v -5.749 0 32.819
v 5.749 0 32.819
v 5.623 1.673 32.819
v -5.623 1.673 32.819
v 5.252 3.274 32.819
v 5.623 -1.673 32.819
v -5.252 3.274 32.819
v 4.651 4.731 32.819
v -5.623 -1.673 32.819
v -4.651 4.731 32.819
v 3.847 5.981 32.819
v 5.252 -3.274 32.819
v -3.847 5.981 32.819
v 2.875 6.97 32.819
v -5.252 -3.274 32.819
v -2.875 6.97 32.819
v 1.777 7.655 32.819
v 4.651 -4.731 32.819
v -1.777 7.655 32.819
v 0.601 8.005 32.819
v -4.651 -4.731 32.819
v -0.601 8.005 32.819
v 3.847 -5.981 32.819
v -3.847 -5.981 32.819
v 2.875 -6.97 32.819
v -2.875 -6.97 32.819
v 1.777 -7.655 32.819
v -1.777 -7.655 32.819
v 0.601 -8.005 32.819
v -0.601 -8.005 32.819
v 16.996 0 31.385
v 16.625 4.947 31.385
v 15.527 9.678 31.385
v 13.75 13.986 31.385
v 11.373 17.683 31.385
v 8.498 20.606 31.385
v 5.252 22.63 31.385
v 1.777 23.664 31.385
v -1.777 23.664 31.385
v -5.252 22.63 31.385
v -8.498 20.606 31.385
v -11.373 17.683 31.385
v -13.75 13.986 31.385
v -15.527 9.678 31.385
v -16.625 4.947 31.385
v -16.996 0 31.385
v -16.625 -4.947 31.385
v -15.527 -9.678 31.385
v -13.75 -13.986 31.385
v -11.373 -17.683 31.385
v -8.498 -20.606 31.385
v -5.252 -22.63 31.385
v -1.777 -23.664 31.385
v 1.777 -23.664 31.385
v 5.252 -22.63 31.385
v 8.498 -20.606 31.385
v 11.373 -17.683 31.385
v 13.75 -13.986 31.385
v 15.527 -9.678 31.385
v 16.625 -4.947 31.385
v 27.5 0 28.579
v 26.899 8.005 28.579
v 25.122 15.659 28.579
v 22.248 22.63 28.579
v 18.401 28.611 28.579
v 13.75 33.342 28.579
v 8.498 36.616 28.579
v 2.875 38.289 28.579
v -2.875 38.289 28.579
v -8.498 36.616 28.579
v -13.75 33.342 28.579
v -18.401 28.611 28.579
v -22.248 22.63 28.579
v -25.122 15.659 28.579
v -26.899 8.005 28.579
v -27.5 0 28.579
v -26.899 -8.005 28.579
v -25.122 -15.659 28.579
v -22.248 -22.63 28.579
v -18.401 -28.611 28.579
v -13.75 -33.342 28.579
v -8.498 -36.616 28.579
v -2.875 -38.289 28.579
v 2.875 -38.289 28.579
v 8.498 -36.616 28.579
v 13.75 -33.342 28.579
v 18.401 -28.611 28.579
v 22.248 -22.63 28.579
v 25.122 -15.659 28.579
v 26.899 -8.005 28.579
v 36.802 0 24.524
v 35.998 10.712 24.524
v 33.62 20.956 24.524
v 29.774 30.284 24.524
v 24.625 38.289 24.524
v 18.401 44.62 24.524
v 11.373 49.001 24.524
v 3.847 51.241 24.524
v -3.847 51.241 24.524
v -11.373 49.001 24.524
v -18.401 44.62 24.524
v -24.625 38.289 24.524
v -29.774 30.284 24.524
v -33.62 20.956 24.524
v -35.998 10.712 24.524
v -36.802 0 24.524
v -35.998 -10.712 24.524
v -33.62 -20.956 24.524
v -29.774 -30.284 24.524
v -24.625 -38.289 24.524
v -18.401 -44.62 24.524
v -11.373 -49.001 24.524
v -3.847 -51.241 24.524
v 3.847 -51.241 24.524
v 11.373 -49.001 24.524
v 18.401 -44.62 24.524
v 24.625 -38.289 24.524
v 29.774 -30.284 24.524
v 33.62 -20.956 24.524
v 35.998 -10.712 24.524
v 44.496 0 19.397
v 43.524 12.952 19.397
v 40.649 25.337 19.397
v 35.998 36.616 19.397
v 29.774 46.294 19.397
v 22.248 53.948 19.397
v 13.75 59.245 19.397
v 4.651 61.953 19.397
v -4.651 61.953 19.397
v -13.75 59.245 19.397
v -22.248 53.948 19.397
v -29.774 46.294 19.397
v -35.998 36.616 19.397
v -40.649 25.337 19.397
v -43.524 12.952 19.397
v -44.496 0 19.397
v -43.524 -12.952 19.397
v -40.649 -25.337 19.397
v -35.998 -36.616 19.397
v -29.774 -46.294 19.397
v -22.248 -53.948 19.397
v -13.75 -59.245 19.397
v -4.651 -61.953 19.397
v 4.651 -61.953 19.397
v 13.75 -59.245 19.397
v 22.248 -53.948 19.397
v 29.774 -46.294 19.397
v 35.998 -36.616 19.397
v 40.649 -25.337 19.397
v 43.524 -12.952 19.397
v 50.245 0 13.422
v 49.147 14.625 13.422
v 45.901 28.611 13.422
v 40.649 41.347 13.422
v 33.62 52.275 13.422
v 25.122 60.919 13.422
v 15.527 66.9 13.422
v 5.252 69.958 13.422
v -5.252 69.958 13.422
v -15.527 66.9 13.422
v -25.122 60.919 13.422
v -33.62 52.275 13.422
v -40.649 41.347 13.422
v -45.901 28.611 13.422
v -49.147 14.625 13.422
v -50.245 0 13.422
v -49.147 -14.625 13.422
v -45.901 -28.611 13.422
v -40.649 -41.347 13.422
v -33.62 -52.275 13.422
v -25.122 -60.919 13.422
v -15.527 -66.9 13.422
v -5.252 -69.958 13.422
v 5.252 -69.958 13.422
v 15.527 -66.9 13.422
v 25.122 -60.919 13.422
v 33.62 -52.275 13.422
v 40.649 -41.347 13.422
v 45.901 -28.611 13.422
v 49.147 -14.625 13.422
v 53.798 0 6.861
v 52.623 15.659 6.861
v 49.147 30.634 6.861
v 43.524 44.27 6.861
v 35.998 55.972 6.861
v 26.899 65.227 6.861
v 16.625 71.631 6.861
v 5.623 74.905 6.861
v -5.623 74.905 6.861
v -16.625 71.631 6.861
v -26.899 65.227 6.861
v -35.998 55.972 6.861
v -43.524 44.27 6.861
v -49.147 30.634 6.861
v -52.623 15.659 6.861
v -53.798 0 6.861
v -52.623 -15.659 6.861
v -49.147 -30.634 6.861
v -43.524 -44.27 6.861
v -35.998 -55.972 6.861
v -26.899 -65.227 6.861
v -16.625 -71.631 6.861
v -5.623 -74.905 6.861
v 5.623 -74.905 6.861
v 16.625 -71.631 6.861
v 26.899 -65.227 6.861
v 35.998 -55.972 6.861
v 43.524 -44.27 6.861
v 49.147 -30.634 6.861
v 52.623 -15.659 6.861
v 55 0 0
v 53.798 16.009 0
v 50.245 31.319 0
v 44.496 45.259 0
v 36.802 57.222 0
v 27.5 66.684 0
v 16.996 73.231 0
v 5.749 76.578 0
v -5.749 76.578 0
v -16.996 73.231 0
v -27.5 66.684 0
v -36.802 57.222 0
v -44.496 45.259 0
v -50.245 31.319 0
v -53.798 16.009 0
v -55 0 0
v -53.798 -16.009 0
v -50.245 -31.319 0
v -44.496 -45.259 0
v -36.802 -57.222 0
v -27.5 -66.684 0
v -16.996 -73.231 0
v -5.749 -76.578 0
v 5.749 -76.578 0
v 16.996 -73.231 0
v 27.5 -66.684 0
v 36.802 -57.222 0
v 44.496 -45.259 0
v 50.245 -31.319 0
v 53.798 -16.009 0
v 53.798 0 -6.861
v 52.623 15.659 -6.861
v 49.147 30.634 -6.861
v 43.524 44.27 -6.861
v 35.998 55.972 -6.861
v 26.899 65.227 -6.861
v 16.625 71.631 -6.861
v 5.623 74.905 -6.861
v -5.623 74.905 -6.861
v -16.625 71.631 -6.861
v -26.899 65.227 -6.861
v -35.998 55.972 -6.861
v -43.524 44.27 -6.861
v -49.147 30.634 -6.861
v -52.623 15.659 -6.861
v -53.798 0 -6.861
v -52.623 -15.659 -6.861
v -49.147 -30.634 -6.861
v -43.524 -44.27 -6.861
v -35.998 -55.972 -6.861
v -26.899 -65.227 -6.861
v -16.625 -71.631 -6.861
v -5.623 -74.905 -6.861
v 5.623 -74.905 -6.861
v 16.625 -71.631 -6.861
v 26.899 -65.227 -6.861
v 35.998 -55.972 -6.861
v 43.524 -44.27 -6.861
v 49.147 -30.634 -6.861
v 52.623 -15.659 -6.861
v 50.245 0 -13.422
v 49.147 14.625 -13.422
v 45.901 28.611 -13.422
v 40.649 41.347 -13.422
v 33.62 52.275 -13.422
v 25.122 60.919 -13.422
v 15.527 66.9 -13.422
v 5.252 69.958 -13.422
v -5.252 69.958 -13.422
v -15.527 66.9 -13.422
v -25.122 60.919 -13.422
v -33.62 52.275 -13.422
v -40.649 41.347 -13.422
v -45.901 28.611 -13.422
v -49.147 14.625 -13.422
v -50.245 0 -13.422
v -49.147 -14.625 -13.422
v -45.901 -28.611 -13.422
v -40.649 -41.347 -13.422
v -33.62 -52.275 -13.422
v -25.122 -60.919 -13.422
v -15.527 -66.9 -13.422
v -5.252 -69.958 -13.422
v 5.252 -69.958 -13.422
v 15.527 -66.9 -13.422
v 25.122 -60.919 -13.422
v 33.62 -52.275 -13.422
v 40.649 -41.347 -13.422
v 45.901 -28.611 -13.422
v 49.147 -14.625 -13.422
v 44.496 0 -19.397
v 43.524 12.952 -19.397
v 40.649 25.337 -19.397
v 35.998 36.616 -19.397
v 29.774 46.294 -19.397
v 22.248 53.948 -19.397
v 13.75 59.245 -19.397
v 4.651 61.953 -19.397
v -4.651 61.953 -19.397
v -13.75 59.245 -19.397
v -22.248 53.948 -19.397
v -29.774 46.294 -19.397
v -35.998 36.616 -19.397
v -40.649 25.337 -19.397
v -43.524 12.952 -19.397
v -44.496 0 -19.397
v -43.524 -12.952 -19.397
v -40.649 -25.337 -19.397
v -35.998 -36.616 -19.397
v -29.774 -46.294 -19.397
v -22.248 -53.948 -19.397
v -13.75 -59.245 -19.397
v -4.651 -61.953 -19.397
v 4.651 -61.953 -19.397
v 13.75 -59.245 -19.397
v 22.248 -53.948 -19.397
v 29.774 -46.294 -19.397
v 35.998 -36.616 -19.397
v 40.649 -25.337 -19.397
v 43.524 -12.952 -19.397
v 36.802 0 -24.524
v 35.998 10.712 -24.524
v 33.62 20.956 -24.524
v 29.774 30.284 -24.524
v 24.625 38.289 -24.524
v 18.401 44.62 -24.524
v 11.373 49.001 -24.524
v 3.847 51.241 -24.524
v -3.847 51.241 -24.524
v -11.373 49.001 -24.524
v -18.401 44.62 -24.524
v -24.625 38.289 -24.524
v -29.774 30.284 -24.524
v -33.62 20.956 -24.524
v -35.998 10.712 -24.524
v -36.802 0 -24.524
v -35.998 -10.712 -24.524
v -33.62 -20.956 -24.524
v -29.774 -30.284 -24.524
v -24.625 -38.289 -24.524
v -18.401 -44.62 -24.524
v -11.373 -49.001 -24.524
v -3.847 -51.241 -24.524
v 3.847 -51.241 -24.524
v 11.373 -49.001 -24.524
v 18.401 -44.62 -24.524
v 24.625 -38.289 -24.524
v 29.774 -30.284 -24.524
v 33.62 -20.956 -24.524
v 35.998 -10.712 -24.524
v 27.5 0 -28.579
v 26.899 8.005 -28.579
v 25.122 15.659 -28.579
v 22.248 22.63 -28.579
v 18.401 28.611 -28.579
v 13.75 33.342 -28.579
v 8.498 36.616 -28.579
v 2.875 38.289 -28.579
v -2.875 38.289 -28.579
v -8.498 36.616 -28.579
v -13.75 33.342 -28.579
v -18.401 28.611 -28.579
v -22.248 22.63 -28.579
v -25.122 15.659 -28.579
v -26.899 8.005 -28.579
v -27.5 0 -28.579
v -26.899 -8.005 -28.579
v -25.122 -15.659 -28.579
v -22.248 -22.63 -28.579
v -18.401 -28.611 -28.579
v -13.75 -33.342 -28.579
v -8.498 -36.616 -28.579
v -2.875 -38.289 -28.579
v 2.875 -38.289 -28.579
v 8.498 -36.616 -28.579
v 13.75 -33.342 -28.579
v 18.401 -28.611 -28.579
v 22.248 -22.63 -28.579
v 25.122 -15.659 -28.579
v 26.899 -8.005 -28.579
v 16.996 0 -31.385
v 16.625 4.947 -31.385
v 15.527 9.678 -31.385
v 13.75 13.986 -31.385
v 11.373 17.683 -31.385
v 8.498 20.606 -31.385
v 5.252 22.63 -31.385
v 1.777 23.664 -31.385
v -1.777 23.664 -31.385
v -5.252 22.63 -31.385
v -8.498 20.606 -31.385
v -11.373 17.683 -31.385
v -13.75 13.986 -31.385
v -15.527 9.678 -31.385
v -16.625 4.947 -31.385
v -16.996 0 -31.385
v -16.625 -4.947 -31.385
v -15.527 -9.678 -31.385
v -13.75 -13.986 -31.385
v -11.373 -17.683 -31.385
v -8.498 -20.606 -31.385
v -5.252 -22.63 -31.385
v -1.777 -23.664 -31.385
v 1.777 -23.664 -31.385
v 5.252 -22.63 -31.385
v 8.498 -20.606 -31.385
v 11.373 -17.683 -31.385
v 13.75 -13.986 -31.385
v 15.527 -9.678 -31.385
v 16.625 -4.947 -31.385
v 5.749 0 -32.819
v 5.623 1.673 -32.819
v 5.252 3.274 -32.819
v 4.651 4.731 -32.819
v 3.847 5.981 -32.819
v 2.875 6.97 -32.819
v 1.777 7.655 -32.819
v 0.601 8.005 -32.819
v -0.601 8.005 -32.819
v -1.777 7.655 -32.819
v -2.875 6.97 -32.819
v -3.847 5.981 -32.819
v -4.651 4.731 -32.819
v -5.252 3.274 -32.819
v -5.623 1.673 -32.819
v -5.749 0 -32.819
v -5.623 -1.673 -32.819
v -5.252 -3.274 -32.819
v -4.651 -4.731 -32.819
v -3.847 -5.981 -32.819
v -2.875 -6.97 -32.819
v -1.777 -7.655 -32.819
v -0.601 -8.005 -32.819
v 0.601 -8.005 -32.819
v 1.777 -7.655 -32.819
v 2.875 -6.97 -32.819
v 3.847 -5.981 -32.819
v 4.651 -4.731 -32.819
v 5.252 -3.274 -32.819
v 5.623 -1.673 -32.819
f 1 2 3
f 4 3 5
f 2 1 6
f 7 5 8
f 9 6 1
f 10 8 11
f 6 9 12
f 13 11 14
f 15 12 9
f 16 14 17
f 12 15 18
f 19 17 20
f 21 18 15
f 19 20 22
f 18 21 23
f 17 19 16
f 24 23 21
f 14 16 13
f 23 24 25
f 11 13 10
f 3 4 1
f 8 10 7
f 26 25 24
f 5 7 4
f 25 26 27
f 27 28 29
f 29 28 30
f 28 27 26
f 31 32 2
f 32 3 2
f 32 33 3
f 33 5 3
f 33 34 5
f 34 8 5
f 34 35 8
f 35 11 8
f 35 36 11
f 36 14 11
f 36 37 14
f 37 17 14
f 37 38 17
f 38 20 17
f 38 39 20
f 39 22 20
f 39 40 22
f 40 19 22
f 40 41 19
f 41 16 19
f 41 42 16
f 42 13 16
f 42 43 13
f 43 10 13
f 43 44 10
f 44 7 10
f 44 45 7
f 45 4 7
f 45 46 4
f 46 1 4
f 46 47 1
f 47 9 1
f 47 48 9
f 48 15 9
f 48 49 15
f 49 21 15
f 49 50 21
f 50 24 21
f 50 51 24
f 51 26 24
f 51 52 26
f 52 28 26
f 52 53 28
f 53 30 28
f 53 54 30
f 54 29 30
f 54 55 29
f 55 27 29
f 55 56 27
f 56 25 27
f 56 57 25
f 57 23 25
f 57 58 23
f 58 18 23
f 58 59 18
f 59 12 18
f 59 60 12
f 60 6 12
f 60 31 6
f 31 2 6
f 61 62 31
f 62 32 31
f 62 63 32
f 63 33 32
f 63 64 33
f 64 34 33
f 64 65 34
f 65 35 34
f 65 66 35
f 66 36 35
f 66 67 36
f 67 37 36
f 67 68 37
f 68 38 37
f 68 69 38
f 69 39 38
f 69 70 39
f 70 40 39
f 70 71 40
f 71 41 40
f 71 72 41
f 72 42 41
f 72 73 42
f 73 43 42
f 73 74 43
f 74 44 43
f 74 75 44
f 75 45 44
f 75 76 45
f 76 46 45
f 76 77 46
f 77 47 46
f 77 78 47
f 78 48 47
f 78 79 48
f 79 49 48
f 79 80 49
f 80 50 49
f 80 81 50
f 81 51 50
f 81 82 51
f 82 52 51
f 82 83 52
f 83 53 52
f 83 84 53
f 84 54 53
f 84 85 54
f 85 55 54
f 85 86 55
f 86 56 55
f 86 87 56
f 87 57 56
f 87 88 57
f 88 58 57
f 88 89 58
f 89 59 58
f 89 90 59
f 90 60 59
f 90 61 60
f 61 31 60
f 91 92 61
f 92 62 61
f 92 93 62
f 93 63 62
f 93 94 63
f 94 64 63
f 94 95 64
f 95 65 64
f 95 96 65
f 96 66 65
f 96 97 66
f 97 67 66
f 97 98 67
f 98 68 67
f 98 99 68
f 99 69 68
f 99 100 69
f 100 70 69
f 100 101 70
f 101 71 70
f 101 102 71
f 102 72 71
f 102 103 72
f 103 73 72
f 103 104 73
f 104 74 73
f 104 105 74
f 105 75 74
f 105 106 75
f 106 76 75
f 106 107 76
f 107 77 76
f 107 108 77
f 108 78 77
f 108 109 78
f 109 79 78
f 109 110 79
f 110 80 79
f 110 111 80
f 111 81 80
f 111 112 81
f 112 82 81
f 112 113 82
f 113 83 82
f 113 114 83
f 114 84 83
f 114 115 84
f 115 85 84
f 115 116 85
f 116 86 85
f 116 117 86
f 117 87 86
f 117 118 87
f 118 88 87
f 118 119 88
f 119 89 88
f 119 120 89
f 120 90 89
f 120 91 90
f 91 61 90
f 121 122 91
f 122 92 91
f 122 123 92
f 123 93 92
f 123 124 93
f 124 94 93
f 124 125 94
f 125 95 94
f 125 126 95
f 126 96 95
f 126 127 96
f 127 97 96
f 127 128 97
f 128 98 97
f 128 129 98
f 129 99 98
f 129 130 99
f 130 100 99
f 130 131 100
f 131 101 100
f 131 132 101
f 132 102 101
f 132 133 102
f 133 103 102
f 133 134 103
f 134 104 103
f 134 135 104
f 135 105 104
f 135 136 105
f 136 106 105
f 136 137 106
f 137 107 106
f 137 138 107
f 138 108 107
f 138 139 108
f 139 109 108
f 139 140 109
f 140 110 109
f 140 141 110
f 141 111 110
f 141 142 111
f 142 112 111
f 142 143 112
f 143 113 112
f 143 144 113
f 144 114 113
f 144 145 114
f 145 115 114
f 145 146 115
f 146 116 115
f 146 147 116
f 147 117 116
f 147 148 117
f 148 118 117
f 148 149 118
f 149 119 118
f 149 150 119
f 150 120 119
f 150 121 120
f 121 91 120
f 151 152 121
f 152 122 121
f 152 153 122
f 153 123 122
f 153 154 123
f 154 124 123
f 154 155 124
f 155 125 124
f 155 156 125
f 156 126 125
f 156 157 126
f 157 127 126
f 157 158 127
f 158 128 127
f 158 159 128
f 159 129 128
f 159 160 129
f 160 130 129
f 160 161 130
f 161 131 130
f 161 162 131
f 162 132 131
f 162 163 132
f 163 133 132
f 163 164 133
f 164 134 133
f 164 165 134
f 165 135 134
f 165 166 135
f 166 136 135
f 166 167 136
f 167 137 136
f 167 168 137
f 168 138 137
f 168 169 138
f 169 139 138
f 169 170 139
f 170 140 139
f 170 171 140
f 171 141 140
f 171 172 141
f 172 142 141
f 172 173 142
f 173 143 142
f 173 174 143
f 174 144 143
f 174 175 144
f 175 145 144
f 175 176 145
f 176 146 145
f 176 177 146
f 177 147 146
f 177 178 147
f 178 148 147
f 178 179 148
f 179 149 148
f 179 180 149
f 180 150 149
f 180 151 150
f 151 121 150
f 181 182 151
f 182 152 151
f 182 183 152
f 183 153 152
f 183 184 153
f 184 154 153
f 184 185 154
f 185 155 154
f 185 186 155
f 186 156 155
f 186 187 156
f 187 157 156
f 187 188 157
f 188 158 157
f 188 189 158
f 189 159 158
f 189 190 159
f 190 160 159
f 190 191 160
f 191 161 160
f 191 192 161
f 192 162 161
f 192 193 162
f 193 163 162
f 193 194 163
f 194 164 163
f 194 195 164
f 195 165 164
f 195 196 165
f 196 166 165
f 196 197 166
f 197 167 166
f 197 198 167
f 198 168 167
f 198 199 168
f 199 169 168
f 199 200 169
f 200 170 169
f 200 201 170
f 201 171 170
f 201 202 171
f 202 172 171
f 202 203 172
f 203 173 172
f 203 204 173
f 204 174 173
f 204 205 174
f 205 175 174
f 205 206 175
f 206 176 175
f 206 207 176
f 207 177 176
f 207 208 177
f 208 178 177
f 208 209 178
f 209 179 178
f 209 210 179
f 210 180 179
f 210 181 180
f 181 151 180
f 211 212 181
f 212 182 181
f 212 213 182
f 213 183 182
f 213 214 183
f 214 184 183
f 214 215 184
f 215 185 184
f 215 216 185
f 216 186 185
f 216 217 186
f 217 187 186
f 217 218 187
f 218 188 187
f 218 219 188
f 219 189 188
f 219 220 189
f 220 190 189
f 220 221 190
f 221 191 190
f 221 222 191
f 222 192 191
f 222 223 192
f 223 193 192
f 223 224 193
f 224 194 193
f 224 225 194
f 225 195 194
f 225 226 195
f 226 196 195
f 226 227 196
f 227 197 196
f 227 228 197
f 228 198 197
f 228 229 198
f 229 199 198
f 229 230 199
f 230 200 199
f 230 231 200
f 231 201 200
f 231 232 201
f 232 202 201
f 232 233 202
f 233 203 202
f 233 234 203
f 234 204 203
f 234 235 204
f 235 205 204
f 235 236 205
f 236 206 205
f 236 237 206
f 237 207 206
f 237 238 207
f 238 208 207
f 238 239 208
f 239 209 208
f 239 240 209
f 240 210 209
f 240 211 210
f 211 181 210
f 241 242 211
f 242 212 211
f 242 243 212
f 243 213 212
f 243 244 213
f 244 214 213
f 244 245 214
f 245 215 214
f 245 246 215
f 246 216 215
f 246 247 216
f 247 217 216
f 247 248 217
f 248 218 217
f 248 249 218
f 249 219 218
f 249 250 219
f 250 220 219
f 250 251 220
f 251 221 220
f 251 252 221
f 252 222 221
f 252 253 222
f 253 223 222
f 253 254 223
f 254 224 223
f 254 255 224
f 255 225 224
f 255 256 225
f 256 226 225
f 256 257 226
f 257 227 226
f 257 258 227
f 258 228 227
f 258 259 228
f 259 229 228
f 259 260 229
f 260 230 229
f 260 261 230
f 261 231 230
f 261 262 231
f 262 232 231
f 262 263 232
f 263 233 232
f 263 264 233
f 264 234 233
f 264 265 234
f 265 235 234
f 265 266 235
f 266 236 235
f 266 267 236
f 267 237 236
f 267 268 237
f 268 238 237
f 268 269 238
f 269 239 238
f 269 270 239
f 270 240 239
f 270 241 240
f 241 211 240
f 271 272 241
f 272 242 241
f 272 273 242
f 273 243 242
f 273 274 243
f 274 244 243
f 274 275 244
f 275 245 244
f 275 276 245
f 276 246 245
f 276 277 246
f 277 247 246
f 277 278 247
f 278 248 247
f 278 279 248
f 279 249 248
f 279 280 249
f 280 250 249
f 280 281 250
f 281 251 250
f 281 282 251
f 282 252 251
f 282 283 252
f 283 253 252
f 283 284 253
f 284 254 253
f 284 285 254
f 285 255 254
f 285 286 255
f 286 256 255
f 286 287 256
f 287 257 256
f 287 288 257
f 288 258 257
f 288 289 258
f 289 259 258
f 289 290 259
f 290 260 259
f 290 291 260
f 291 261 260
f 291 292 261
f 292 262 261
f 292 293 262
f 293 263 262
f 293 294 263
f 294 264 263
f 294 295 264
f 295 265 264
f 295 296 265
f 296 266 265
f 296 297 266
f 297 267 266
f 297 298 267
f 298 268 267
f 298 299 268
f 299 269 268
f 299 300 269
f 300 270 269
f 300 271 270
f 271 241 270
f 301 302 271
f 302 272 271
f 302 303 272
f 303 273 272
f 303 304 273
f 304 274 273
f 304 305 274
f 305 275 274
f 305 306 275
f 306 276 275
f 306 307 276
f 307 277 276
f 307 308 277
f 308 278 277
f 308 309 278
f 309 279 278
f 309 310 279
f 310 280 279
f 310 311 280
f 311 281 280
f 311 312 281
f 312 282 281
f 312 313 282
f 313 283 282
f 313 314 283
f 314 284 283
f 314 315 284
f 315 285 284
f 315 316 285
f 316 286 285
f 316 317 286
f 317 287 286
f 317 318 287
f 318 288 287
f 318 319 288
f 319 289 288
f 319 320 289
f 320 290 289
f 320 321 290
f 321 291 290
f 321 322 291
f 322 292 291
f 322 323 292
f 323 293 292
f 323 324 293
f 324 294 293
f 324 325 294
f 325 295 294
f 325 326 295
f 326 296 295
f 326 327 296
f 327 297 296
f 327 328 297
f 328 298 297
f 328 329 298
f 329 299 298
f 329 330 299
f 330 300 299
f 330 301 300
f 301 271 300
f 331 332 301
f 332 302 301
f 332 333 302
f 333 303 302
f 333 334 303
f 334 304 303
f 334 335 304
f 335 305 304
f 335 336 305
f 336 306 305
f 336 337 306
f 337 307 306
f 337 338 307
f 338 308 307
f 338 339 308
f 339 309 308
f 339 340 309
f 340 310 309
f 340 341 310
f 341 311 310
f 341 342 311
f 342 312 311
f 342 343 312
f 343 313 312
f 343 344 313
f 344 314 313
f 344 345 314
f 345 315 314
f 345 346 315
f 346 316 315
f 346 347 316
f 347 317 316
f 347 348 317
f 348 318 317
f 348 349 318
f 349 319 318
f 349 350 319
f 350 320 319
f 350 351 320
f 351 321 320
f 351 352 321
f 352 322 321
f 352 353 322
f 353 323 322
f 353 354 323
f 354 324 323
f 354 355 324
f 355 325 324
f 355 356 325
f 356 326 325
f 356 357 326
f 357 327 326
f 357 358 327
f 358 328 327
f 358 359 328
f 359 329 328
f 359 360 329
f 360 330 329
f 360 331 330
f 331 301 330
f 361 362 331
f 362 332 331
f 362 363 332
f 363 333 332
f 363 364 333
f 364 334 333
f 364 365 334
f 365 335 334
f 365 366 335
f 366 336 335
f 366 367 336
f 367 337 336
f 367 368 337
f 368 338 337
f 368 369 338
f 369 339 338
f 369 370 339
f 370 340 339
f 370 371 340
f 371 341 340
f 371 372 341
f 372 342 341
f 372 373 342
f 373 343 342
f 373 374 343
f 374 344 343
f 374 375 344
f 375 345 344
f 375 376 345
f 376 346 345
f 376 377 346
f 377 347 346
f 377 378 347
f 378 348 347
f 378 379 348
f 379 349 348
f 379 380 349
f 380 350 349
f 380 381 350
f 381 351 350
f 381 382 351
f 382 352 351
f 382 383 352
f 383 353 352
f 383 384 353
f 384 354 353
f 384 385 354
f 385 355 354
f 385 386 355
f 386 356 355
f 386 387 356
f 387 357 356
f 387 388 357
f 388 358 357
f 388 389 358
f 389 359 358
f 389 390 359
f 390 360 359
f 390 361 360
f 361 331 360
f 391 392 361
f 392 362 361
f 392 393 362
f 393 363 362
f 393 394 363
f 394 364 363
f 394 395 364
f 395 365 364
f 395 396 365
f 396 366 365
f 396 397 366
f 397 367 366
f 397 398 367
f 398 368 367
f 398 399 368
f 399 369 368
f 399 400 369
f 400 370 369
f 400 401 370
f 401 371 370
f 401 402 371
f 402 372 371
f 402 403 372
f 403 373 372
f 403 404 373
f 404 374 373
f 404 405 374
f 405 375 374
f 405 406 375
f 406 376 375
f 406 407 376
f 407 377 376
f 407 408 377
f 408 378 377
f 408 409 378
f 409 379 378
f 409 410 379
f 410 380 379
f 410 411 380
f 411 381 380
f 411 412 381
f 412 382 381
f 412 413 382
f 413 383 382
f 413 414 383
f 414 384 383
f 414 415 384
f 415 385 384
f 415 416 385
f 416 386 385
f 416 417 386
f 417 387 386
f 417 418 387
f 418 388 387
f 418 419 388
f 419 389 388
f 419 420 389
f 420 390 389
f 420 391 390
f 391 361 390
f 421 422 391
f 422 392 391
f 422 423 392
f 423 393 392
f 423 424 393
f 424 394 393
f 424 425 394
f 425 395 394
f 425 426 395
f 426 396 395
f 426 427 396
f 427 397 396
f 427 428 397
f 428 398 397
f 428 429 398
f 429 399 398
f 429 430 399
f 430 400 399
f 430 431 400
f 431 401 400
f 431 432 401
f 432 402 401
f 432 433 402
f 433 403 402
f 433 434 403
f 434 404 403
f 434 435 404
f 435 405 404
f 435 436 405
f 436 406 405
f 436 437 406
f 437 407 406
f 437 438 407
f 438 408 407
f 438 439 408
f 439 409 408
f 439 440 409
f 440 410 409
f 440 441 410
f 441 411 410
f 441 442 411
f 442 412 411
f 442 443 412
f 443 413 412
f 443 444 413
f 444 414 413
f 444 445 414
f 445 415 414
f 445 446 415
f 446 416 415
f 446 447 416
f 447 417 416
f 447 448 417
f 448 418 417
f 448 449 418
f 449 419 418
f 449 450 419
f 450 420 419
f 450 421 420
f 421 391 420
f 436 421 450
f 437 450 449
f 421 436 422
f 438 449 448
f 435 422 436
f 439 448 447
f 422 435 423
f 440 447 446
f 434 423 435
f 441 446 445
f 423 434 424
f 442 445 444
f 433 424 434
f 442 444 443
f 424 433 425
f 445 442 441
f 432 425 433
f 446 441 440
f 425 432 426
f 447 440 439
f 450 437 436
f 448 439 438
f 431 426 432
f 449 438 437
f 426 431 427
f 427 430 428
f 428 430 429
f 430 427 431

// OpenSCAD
// Generated by SolidPython 1.0.1 on 2020-07-29 00:46:46


scale(v = [5, 7, 3]) {
	sphere(r = 11);
}
/***********************************************
*********      SolidPython code:      **********
************************************************
 
# import packages: SolidPython
from solid import *
from solid.utils import *
from itertools import chain, combinations, permutations


class Resize:

    def __init__(self, scad_file):
        self.scad_file = scad_file
        #self.scad_file = import_scad(scad_file)
        # cone/cylinder param:
        self.r1 = 0
        self.r2 = 0
        self.h = 0
        # rectangular prism param:
        self.w = 0
        self.l = 0
        # ellipse param:
        self.r = 0

    # import OpenScad code (file name corresponds to shape)


    # classify shape + parameters
    def assign(self, param1, param2, param3):
        if self.scad_file == 'cone.scad':
            self.r1 = param1
            self.r2 = param2
            self.h = param3
        elif self.scad_file == 'cylinder.scad':
            self.r1 = param1
            self.r2 = param2
            self.h = param3
        elif self.scad_file == 'rectangularPrism.scad':
            self.h = param1
            self.l = param2
            self.w = param3
        else:
            self.r = param1
            self.h = param2

    # resize parameters
    def iterate(self):
        x = range(3, 20, 2)
        i = 1
        if self.scad_file == 'cone.scad':
            tempList = list(permutations(x, 2))
            for temp in tempList:
                param1 = temp[0]
                param2 = temp[1]
                filepath = 'produced_scad_files/' + 'cone' + str(param1) + '_' + str(param2) + '_' + '.scad'
                scad_render_to_file(cylinder(h=param1, r1=param2, r2=0), filepath)

        elif self.scad_file == 'cylinder.scad':
            tempList = list(permutations(x, 3))
            for temp in tempList:
                param1 = temp[0]
                param2 = temp[1]
                filepath = 'produced_scad_files/' + 'cylinder' + str(param1) + '_' + str(param2) + '_' + '.scad'
                scad_render_to_file(cylinder(h=param1, r1=param2, r2=param2), filepath)

        elif self.scad_file == 'rectangularPrism.scad':
            tempList = list(permutations(x, 3))
            for temp in tempList:
                param1 = temp[0]
                param2 = temp[1]
                param3 = temp[2]
                filepath = 'produced_scad_files/' + 'rectangularPrism' + str(param1) + '_' + str(param2) + '_' + str(
                    param3) + '.scad'
                scad_render_to_file(cube(size=(param1, param2, param3)), filepath)

        elif self.scad_file == 'ellipse.scad':
            tempList = list(permutations(x, 4))
            for temp in tempList:
                param1 = temp[0]
                param2 = temp[1]
                param3 = temp[2]
                param4 = temp[3]
                filepath = 'produced_scad_files/' + 'ellipse' + str(param1) + '_' + str(param2) + '_' + str(param3) + '_' + str(param4) + '.scad'
                scad_render_to_file(scale([param1, param2, param3])(sphere(r=param4)), filepath)

    def render_to_scadfile(self):
        scad_render_to_file(scad, 'example.scad') 
 
************************************************/
